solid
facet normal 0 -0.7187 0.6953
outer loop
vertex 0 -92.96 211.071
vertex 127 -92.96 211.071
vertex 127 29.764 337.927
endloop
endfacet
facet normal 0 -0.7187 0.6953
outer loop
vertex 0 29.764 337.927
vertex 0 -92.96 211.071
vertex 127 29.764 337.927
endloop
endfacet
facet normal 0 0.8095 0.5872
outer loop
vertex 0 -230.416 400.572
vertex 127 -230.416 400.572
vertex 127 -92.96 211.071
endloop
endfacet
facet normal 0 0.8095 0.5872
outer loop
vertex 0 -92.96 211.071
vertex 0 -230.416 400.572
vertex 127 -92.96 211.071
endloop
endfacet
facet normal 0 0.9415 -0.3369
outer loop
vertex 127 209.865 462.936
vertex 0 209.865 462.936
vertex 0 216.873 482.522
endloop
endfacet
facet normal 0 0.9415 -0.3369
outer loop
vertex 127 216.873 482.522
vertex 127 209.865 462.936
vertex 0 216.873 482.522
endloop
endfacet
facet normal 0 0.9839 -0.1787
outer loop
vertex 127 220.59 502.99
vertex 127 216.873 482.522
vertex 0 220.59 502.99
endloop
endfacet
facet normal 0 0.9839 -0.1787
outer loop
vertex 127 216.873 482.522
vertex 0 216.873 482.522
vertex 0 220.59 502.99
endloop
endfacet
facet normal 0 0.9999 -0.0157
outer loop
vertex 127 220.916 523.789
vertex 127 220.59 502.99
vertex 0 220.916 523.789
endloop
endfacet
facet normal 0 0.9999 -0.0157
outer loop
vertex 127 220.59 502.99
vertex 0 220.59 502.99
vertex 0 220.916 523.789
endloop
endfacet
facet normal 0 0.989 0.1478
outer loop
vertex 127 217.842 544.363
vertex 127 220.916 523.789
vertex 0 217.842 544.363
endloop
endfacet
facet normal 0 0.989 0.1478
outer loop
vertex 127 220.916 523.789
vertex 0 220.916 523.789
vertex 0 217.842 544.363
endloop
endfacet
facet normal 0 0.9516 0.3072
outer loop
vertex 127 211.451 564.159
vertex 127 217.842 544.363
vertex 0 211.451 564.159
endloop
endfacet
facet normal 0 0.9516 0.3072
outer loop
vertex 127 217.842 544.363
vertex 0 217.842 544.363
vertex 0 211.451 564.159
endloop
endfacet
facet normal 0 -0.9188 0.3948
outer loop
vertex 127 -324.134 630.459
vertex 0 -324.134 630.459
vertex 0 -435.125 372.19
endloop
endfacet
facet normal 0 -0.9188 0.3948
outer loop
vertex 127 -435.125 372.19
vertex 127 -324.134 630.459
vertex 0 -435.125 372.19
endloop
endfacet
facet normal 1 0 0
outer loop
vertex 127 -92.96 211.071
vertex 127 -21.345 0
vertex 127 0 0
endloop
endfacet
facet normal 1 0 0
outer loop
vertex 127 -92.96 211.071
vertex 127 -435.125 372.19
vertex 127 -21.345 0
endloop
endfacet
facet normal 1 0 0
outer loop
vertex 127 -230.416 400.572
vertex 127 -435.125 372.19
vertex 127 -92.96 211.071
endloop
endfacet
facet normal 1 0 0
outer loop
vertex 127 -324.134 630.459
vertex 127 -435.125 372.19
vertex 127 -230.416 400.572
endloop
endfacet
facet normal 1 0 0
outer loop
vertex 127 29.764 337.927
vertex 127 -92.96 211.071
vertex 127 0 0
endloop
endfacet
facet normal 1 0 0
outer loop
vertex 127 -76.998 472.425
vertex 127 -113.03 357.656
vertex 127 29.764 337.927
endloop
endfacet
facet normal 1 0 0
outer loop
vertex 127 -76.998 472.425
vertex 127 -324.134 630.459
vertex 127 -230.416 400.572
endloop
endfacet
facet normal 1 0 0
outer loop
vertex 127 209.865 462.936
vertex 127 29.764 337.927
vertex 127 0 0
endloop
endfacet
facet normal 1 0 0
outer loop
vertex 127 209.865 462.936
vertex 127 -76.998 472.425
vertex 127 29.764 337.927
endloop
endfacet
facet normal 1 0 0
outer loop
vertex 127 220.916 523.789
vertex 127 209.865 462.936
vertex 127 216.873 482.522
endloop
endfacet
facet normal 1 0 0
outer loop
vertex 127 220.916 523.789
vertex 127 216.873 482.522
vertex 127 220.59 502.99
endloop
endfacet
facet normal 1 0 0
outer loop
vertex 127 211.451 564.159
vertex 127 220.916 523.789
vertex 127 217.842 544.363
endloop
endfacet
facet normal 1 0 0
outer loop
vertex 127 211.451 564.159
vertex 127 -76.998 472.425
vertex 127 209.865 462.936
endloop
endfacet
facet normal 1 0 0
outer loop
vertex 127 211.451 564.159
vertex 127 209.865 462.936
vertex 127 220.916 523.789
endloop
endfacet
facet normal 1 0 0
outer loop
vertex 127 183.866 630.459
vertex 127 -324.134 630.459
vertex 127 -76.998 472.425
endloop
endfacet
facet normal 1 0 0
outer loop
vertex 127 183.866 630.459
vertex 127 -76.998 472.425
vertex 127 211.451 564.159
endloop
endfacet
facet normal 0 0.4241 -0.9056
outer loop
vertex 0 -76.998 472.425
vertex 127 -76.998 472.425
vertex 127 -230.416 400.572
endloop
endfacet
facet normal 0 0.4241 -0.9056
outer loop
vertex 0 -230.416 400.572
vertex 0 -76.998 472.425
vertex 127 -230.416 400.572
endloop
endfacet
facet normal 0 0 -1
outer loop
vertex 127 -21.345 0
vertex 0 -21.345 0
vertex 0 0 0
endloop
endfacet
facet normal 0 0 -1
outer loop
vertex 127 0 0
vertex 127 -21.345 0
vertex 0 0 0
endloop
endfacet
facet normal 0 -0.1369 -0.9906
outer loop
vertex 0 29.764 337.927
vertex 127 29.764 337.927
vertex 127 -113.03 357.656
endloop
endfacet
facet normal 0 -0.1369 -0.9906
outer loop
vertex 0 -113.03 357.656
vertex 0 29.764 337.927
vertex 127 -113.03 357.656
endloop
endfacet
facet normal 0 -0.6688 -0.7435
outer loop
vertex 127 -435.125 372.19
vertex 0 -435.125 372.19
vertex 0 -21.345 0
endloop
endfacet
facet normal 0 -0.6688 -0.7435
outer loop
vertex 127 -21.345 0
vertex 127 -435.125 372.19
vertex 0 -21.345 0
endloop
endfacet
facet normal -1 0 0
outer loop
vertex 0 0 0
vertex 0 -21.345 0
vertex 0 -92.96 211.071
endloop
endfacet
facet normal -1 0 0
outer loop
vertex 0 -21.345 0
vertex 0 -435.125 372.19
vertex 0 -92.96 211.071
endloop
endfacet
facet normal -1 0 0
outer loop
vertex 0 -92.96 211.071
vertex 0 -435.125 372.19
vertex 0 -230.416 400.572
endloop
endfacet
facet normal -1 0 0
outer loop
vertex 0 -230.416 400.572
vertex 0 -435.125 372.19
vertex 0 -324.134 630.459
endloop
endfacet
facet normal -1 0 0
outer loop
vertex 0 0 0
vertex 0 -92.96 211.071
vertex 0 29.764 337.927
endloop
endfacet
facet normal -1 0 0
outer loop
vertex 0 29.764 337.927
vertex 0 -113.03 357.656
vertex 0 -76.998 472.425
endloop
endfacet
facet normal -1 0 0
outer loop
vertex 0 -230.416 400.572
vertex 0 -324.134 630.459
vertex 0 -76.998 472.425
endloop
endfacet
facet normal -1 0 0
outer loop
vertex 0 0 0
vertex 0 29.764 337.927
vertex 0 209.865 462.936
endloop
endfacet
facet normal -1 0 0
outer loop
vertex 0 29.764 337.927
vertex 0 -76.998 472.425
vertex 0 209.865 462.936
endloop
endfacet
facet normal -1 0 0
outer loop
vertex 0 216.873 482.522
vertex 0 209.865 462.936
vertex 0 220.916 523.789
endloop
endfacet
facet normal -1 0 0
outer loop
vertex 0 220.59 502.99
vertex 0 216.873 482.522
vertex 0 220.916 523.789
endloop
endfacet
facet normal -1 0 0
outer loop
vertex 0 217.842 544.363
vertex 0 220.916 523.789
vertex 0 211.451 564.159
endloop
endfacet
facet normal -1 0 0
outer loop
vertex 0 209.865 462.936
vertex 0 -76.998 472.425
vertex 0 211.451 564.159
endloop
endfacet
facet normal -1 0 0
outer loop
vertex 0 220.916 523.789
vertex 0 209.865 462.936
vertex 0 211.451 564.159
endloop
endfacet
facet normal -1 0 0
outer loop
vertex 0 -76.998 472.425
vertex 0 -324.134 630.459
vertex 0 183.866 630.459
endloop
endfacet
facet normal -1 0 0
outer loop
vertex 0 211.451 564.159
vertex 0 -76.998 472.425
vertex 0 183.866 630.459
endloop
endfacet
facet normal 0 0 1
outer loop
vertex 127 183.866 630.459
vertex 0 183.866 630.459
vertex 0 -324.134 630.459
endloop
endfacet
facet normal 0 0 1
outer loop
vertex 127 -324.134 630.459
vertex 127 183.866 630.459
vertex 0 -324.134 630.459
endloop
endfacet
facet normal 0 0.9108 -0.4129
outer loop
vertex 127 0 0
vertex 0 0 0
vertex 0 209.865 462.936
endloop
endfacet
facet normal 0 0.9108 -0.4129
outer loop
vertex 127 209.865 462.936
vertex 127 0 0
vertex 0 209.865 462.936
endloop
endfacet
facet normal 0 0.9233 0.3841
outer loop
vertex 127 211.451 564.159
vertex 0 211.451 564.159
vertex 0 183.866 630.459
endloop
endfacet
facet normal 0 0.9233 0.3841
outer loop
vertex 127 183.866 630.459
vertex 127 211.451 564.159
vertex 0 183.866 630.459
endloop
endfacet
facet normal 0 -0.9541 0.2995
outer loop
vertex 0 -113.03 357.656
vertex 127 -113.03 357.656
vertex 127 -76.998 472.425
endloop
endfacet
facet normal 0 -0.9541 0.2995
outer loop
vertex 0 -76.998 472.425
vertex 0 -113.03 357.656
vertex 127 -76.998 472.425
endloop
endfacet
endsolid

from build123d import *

# Parameters (mm, degrees)
F1_DEPTH = 127
F3_DEPTH = 254


with BuildPart() as f1:
    # F0 (on Right) → F1 (new body)
    with BuildSketch(Plane.YZ):
        with BuildLine():
            Line((-21.34454, 0), (0, 0))
            Line((0, 0), (209.8645, 462.936498))
            ThreePointArc((209.8645, 462.936498), (221.179593, 513.382616), (211.45127, 564.158614))
            Line((211.45127, 564.158614), (183.866499, 630.458851))
            Line((183.866499, 630.458851), (-324.133501, 630.458851))
            Line((-324.133501, 630.458851), (-435.125129, 372.189923))
            Line((-435.125129, 372.189923), (-21.34454, 0))
        make_face()
    extrude(amount=F1_DEPTH)

    # F2 (on face) → F3 (cut)
    with BuildSketch(Plane.YZ.offset(127)):
        Polygon((-76.997541, 472.424954), (-230.415642, 400.5723), (-92.960328, 211.070791), (29.763866, 337.927192), (-113.02951, 357.656449), align=None)
    extrude(amount=-F3_DEPTH, mode=Mode.SUBTRACT)


solid = f1.part
